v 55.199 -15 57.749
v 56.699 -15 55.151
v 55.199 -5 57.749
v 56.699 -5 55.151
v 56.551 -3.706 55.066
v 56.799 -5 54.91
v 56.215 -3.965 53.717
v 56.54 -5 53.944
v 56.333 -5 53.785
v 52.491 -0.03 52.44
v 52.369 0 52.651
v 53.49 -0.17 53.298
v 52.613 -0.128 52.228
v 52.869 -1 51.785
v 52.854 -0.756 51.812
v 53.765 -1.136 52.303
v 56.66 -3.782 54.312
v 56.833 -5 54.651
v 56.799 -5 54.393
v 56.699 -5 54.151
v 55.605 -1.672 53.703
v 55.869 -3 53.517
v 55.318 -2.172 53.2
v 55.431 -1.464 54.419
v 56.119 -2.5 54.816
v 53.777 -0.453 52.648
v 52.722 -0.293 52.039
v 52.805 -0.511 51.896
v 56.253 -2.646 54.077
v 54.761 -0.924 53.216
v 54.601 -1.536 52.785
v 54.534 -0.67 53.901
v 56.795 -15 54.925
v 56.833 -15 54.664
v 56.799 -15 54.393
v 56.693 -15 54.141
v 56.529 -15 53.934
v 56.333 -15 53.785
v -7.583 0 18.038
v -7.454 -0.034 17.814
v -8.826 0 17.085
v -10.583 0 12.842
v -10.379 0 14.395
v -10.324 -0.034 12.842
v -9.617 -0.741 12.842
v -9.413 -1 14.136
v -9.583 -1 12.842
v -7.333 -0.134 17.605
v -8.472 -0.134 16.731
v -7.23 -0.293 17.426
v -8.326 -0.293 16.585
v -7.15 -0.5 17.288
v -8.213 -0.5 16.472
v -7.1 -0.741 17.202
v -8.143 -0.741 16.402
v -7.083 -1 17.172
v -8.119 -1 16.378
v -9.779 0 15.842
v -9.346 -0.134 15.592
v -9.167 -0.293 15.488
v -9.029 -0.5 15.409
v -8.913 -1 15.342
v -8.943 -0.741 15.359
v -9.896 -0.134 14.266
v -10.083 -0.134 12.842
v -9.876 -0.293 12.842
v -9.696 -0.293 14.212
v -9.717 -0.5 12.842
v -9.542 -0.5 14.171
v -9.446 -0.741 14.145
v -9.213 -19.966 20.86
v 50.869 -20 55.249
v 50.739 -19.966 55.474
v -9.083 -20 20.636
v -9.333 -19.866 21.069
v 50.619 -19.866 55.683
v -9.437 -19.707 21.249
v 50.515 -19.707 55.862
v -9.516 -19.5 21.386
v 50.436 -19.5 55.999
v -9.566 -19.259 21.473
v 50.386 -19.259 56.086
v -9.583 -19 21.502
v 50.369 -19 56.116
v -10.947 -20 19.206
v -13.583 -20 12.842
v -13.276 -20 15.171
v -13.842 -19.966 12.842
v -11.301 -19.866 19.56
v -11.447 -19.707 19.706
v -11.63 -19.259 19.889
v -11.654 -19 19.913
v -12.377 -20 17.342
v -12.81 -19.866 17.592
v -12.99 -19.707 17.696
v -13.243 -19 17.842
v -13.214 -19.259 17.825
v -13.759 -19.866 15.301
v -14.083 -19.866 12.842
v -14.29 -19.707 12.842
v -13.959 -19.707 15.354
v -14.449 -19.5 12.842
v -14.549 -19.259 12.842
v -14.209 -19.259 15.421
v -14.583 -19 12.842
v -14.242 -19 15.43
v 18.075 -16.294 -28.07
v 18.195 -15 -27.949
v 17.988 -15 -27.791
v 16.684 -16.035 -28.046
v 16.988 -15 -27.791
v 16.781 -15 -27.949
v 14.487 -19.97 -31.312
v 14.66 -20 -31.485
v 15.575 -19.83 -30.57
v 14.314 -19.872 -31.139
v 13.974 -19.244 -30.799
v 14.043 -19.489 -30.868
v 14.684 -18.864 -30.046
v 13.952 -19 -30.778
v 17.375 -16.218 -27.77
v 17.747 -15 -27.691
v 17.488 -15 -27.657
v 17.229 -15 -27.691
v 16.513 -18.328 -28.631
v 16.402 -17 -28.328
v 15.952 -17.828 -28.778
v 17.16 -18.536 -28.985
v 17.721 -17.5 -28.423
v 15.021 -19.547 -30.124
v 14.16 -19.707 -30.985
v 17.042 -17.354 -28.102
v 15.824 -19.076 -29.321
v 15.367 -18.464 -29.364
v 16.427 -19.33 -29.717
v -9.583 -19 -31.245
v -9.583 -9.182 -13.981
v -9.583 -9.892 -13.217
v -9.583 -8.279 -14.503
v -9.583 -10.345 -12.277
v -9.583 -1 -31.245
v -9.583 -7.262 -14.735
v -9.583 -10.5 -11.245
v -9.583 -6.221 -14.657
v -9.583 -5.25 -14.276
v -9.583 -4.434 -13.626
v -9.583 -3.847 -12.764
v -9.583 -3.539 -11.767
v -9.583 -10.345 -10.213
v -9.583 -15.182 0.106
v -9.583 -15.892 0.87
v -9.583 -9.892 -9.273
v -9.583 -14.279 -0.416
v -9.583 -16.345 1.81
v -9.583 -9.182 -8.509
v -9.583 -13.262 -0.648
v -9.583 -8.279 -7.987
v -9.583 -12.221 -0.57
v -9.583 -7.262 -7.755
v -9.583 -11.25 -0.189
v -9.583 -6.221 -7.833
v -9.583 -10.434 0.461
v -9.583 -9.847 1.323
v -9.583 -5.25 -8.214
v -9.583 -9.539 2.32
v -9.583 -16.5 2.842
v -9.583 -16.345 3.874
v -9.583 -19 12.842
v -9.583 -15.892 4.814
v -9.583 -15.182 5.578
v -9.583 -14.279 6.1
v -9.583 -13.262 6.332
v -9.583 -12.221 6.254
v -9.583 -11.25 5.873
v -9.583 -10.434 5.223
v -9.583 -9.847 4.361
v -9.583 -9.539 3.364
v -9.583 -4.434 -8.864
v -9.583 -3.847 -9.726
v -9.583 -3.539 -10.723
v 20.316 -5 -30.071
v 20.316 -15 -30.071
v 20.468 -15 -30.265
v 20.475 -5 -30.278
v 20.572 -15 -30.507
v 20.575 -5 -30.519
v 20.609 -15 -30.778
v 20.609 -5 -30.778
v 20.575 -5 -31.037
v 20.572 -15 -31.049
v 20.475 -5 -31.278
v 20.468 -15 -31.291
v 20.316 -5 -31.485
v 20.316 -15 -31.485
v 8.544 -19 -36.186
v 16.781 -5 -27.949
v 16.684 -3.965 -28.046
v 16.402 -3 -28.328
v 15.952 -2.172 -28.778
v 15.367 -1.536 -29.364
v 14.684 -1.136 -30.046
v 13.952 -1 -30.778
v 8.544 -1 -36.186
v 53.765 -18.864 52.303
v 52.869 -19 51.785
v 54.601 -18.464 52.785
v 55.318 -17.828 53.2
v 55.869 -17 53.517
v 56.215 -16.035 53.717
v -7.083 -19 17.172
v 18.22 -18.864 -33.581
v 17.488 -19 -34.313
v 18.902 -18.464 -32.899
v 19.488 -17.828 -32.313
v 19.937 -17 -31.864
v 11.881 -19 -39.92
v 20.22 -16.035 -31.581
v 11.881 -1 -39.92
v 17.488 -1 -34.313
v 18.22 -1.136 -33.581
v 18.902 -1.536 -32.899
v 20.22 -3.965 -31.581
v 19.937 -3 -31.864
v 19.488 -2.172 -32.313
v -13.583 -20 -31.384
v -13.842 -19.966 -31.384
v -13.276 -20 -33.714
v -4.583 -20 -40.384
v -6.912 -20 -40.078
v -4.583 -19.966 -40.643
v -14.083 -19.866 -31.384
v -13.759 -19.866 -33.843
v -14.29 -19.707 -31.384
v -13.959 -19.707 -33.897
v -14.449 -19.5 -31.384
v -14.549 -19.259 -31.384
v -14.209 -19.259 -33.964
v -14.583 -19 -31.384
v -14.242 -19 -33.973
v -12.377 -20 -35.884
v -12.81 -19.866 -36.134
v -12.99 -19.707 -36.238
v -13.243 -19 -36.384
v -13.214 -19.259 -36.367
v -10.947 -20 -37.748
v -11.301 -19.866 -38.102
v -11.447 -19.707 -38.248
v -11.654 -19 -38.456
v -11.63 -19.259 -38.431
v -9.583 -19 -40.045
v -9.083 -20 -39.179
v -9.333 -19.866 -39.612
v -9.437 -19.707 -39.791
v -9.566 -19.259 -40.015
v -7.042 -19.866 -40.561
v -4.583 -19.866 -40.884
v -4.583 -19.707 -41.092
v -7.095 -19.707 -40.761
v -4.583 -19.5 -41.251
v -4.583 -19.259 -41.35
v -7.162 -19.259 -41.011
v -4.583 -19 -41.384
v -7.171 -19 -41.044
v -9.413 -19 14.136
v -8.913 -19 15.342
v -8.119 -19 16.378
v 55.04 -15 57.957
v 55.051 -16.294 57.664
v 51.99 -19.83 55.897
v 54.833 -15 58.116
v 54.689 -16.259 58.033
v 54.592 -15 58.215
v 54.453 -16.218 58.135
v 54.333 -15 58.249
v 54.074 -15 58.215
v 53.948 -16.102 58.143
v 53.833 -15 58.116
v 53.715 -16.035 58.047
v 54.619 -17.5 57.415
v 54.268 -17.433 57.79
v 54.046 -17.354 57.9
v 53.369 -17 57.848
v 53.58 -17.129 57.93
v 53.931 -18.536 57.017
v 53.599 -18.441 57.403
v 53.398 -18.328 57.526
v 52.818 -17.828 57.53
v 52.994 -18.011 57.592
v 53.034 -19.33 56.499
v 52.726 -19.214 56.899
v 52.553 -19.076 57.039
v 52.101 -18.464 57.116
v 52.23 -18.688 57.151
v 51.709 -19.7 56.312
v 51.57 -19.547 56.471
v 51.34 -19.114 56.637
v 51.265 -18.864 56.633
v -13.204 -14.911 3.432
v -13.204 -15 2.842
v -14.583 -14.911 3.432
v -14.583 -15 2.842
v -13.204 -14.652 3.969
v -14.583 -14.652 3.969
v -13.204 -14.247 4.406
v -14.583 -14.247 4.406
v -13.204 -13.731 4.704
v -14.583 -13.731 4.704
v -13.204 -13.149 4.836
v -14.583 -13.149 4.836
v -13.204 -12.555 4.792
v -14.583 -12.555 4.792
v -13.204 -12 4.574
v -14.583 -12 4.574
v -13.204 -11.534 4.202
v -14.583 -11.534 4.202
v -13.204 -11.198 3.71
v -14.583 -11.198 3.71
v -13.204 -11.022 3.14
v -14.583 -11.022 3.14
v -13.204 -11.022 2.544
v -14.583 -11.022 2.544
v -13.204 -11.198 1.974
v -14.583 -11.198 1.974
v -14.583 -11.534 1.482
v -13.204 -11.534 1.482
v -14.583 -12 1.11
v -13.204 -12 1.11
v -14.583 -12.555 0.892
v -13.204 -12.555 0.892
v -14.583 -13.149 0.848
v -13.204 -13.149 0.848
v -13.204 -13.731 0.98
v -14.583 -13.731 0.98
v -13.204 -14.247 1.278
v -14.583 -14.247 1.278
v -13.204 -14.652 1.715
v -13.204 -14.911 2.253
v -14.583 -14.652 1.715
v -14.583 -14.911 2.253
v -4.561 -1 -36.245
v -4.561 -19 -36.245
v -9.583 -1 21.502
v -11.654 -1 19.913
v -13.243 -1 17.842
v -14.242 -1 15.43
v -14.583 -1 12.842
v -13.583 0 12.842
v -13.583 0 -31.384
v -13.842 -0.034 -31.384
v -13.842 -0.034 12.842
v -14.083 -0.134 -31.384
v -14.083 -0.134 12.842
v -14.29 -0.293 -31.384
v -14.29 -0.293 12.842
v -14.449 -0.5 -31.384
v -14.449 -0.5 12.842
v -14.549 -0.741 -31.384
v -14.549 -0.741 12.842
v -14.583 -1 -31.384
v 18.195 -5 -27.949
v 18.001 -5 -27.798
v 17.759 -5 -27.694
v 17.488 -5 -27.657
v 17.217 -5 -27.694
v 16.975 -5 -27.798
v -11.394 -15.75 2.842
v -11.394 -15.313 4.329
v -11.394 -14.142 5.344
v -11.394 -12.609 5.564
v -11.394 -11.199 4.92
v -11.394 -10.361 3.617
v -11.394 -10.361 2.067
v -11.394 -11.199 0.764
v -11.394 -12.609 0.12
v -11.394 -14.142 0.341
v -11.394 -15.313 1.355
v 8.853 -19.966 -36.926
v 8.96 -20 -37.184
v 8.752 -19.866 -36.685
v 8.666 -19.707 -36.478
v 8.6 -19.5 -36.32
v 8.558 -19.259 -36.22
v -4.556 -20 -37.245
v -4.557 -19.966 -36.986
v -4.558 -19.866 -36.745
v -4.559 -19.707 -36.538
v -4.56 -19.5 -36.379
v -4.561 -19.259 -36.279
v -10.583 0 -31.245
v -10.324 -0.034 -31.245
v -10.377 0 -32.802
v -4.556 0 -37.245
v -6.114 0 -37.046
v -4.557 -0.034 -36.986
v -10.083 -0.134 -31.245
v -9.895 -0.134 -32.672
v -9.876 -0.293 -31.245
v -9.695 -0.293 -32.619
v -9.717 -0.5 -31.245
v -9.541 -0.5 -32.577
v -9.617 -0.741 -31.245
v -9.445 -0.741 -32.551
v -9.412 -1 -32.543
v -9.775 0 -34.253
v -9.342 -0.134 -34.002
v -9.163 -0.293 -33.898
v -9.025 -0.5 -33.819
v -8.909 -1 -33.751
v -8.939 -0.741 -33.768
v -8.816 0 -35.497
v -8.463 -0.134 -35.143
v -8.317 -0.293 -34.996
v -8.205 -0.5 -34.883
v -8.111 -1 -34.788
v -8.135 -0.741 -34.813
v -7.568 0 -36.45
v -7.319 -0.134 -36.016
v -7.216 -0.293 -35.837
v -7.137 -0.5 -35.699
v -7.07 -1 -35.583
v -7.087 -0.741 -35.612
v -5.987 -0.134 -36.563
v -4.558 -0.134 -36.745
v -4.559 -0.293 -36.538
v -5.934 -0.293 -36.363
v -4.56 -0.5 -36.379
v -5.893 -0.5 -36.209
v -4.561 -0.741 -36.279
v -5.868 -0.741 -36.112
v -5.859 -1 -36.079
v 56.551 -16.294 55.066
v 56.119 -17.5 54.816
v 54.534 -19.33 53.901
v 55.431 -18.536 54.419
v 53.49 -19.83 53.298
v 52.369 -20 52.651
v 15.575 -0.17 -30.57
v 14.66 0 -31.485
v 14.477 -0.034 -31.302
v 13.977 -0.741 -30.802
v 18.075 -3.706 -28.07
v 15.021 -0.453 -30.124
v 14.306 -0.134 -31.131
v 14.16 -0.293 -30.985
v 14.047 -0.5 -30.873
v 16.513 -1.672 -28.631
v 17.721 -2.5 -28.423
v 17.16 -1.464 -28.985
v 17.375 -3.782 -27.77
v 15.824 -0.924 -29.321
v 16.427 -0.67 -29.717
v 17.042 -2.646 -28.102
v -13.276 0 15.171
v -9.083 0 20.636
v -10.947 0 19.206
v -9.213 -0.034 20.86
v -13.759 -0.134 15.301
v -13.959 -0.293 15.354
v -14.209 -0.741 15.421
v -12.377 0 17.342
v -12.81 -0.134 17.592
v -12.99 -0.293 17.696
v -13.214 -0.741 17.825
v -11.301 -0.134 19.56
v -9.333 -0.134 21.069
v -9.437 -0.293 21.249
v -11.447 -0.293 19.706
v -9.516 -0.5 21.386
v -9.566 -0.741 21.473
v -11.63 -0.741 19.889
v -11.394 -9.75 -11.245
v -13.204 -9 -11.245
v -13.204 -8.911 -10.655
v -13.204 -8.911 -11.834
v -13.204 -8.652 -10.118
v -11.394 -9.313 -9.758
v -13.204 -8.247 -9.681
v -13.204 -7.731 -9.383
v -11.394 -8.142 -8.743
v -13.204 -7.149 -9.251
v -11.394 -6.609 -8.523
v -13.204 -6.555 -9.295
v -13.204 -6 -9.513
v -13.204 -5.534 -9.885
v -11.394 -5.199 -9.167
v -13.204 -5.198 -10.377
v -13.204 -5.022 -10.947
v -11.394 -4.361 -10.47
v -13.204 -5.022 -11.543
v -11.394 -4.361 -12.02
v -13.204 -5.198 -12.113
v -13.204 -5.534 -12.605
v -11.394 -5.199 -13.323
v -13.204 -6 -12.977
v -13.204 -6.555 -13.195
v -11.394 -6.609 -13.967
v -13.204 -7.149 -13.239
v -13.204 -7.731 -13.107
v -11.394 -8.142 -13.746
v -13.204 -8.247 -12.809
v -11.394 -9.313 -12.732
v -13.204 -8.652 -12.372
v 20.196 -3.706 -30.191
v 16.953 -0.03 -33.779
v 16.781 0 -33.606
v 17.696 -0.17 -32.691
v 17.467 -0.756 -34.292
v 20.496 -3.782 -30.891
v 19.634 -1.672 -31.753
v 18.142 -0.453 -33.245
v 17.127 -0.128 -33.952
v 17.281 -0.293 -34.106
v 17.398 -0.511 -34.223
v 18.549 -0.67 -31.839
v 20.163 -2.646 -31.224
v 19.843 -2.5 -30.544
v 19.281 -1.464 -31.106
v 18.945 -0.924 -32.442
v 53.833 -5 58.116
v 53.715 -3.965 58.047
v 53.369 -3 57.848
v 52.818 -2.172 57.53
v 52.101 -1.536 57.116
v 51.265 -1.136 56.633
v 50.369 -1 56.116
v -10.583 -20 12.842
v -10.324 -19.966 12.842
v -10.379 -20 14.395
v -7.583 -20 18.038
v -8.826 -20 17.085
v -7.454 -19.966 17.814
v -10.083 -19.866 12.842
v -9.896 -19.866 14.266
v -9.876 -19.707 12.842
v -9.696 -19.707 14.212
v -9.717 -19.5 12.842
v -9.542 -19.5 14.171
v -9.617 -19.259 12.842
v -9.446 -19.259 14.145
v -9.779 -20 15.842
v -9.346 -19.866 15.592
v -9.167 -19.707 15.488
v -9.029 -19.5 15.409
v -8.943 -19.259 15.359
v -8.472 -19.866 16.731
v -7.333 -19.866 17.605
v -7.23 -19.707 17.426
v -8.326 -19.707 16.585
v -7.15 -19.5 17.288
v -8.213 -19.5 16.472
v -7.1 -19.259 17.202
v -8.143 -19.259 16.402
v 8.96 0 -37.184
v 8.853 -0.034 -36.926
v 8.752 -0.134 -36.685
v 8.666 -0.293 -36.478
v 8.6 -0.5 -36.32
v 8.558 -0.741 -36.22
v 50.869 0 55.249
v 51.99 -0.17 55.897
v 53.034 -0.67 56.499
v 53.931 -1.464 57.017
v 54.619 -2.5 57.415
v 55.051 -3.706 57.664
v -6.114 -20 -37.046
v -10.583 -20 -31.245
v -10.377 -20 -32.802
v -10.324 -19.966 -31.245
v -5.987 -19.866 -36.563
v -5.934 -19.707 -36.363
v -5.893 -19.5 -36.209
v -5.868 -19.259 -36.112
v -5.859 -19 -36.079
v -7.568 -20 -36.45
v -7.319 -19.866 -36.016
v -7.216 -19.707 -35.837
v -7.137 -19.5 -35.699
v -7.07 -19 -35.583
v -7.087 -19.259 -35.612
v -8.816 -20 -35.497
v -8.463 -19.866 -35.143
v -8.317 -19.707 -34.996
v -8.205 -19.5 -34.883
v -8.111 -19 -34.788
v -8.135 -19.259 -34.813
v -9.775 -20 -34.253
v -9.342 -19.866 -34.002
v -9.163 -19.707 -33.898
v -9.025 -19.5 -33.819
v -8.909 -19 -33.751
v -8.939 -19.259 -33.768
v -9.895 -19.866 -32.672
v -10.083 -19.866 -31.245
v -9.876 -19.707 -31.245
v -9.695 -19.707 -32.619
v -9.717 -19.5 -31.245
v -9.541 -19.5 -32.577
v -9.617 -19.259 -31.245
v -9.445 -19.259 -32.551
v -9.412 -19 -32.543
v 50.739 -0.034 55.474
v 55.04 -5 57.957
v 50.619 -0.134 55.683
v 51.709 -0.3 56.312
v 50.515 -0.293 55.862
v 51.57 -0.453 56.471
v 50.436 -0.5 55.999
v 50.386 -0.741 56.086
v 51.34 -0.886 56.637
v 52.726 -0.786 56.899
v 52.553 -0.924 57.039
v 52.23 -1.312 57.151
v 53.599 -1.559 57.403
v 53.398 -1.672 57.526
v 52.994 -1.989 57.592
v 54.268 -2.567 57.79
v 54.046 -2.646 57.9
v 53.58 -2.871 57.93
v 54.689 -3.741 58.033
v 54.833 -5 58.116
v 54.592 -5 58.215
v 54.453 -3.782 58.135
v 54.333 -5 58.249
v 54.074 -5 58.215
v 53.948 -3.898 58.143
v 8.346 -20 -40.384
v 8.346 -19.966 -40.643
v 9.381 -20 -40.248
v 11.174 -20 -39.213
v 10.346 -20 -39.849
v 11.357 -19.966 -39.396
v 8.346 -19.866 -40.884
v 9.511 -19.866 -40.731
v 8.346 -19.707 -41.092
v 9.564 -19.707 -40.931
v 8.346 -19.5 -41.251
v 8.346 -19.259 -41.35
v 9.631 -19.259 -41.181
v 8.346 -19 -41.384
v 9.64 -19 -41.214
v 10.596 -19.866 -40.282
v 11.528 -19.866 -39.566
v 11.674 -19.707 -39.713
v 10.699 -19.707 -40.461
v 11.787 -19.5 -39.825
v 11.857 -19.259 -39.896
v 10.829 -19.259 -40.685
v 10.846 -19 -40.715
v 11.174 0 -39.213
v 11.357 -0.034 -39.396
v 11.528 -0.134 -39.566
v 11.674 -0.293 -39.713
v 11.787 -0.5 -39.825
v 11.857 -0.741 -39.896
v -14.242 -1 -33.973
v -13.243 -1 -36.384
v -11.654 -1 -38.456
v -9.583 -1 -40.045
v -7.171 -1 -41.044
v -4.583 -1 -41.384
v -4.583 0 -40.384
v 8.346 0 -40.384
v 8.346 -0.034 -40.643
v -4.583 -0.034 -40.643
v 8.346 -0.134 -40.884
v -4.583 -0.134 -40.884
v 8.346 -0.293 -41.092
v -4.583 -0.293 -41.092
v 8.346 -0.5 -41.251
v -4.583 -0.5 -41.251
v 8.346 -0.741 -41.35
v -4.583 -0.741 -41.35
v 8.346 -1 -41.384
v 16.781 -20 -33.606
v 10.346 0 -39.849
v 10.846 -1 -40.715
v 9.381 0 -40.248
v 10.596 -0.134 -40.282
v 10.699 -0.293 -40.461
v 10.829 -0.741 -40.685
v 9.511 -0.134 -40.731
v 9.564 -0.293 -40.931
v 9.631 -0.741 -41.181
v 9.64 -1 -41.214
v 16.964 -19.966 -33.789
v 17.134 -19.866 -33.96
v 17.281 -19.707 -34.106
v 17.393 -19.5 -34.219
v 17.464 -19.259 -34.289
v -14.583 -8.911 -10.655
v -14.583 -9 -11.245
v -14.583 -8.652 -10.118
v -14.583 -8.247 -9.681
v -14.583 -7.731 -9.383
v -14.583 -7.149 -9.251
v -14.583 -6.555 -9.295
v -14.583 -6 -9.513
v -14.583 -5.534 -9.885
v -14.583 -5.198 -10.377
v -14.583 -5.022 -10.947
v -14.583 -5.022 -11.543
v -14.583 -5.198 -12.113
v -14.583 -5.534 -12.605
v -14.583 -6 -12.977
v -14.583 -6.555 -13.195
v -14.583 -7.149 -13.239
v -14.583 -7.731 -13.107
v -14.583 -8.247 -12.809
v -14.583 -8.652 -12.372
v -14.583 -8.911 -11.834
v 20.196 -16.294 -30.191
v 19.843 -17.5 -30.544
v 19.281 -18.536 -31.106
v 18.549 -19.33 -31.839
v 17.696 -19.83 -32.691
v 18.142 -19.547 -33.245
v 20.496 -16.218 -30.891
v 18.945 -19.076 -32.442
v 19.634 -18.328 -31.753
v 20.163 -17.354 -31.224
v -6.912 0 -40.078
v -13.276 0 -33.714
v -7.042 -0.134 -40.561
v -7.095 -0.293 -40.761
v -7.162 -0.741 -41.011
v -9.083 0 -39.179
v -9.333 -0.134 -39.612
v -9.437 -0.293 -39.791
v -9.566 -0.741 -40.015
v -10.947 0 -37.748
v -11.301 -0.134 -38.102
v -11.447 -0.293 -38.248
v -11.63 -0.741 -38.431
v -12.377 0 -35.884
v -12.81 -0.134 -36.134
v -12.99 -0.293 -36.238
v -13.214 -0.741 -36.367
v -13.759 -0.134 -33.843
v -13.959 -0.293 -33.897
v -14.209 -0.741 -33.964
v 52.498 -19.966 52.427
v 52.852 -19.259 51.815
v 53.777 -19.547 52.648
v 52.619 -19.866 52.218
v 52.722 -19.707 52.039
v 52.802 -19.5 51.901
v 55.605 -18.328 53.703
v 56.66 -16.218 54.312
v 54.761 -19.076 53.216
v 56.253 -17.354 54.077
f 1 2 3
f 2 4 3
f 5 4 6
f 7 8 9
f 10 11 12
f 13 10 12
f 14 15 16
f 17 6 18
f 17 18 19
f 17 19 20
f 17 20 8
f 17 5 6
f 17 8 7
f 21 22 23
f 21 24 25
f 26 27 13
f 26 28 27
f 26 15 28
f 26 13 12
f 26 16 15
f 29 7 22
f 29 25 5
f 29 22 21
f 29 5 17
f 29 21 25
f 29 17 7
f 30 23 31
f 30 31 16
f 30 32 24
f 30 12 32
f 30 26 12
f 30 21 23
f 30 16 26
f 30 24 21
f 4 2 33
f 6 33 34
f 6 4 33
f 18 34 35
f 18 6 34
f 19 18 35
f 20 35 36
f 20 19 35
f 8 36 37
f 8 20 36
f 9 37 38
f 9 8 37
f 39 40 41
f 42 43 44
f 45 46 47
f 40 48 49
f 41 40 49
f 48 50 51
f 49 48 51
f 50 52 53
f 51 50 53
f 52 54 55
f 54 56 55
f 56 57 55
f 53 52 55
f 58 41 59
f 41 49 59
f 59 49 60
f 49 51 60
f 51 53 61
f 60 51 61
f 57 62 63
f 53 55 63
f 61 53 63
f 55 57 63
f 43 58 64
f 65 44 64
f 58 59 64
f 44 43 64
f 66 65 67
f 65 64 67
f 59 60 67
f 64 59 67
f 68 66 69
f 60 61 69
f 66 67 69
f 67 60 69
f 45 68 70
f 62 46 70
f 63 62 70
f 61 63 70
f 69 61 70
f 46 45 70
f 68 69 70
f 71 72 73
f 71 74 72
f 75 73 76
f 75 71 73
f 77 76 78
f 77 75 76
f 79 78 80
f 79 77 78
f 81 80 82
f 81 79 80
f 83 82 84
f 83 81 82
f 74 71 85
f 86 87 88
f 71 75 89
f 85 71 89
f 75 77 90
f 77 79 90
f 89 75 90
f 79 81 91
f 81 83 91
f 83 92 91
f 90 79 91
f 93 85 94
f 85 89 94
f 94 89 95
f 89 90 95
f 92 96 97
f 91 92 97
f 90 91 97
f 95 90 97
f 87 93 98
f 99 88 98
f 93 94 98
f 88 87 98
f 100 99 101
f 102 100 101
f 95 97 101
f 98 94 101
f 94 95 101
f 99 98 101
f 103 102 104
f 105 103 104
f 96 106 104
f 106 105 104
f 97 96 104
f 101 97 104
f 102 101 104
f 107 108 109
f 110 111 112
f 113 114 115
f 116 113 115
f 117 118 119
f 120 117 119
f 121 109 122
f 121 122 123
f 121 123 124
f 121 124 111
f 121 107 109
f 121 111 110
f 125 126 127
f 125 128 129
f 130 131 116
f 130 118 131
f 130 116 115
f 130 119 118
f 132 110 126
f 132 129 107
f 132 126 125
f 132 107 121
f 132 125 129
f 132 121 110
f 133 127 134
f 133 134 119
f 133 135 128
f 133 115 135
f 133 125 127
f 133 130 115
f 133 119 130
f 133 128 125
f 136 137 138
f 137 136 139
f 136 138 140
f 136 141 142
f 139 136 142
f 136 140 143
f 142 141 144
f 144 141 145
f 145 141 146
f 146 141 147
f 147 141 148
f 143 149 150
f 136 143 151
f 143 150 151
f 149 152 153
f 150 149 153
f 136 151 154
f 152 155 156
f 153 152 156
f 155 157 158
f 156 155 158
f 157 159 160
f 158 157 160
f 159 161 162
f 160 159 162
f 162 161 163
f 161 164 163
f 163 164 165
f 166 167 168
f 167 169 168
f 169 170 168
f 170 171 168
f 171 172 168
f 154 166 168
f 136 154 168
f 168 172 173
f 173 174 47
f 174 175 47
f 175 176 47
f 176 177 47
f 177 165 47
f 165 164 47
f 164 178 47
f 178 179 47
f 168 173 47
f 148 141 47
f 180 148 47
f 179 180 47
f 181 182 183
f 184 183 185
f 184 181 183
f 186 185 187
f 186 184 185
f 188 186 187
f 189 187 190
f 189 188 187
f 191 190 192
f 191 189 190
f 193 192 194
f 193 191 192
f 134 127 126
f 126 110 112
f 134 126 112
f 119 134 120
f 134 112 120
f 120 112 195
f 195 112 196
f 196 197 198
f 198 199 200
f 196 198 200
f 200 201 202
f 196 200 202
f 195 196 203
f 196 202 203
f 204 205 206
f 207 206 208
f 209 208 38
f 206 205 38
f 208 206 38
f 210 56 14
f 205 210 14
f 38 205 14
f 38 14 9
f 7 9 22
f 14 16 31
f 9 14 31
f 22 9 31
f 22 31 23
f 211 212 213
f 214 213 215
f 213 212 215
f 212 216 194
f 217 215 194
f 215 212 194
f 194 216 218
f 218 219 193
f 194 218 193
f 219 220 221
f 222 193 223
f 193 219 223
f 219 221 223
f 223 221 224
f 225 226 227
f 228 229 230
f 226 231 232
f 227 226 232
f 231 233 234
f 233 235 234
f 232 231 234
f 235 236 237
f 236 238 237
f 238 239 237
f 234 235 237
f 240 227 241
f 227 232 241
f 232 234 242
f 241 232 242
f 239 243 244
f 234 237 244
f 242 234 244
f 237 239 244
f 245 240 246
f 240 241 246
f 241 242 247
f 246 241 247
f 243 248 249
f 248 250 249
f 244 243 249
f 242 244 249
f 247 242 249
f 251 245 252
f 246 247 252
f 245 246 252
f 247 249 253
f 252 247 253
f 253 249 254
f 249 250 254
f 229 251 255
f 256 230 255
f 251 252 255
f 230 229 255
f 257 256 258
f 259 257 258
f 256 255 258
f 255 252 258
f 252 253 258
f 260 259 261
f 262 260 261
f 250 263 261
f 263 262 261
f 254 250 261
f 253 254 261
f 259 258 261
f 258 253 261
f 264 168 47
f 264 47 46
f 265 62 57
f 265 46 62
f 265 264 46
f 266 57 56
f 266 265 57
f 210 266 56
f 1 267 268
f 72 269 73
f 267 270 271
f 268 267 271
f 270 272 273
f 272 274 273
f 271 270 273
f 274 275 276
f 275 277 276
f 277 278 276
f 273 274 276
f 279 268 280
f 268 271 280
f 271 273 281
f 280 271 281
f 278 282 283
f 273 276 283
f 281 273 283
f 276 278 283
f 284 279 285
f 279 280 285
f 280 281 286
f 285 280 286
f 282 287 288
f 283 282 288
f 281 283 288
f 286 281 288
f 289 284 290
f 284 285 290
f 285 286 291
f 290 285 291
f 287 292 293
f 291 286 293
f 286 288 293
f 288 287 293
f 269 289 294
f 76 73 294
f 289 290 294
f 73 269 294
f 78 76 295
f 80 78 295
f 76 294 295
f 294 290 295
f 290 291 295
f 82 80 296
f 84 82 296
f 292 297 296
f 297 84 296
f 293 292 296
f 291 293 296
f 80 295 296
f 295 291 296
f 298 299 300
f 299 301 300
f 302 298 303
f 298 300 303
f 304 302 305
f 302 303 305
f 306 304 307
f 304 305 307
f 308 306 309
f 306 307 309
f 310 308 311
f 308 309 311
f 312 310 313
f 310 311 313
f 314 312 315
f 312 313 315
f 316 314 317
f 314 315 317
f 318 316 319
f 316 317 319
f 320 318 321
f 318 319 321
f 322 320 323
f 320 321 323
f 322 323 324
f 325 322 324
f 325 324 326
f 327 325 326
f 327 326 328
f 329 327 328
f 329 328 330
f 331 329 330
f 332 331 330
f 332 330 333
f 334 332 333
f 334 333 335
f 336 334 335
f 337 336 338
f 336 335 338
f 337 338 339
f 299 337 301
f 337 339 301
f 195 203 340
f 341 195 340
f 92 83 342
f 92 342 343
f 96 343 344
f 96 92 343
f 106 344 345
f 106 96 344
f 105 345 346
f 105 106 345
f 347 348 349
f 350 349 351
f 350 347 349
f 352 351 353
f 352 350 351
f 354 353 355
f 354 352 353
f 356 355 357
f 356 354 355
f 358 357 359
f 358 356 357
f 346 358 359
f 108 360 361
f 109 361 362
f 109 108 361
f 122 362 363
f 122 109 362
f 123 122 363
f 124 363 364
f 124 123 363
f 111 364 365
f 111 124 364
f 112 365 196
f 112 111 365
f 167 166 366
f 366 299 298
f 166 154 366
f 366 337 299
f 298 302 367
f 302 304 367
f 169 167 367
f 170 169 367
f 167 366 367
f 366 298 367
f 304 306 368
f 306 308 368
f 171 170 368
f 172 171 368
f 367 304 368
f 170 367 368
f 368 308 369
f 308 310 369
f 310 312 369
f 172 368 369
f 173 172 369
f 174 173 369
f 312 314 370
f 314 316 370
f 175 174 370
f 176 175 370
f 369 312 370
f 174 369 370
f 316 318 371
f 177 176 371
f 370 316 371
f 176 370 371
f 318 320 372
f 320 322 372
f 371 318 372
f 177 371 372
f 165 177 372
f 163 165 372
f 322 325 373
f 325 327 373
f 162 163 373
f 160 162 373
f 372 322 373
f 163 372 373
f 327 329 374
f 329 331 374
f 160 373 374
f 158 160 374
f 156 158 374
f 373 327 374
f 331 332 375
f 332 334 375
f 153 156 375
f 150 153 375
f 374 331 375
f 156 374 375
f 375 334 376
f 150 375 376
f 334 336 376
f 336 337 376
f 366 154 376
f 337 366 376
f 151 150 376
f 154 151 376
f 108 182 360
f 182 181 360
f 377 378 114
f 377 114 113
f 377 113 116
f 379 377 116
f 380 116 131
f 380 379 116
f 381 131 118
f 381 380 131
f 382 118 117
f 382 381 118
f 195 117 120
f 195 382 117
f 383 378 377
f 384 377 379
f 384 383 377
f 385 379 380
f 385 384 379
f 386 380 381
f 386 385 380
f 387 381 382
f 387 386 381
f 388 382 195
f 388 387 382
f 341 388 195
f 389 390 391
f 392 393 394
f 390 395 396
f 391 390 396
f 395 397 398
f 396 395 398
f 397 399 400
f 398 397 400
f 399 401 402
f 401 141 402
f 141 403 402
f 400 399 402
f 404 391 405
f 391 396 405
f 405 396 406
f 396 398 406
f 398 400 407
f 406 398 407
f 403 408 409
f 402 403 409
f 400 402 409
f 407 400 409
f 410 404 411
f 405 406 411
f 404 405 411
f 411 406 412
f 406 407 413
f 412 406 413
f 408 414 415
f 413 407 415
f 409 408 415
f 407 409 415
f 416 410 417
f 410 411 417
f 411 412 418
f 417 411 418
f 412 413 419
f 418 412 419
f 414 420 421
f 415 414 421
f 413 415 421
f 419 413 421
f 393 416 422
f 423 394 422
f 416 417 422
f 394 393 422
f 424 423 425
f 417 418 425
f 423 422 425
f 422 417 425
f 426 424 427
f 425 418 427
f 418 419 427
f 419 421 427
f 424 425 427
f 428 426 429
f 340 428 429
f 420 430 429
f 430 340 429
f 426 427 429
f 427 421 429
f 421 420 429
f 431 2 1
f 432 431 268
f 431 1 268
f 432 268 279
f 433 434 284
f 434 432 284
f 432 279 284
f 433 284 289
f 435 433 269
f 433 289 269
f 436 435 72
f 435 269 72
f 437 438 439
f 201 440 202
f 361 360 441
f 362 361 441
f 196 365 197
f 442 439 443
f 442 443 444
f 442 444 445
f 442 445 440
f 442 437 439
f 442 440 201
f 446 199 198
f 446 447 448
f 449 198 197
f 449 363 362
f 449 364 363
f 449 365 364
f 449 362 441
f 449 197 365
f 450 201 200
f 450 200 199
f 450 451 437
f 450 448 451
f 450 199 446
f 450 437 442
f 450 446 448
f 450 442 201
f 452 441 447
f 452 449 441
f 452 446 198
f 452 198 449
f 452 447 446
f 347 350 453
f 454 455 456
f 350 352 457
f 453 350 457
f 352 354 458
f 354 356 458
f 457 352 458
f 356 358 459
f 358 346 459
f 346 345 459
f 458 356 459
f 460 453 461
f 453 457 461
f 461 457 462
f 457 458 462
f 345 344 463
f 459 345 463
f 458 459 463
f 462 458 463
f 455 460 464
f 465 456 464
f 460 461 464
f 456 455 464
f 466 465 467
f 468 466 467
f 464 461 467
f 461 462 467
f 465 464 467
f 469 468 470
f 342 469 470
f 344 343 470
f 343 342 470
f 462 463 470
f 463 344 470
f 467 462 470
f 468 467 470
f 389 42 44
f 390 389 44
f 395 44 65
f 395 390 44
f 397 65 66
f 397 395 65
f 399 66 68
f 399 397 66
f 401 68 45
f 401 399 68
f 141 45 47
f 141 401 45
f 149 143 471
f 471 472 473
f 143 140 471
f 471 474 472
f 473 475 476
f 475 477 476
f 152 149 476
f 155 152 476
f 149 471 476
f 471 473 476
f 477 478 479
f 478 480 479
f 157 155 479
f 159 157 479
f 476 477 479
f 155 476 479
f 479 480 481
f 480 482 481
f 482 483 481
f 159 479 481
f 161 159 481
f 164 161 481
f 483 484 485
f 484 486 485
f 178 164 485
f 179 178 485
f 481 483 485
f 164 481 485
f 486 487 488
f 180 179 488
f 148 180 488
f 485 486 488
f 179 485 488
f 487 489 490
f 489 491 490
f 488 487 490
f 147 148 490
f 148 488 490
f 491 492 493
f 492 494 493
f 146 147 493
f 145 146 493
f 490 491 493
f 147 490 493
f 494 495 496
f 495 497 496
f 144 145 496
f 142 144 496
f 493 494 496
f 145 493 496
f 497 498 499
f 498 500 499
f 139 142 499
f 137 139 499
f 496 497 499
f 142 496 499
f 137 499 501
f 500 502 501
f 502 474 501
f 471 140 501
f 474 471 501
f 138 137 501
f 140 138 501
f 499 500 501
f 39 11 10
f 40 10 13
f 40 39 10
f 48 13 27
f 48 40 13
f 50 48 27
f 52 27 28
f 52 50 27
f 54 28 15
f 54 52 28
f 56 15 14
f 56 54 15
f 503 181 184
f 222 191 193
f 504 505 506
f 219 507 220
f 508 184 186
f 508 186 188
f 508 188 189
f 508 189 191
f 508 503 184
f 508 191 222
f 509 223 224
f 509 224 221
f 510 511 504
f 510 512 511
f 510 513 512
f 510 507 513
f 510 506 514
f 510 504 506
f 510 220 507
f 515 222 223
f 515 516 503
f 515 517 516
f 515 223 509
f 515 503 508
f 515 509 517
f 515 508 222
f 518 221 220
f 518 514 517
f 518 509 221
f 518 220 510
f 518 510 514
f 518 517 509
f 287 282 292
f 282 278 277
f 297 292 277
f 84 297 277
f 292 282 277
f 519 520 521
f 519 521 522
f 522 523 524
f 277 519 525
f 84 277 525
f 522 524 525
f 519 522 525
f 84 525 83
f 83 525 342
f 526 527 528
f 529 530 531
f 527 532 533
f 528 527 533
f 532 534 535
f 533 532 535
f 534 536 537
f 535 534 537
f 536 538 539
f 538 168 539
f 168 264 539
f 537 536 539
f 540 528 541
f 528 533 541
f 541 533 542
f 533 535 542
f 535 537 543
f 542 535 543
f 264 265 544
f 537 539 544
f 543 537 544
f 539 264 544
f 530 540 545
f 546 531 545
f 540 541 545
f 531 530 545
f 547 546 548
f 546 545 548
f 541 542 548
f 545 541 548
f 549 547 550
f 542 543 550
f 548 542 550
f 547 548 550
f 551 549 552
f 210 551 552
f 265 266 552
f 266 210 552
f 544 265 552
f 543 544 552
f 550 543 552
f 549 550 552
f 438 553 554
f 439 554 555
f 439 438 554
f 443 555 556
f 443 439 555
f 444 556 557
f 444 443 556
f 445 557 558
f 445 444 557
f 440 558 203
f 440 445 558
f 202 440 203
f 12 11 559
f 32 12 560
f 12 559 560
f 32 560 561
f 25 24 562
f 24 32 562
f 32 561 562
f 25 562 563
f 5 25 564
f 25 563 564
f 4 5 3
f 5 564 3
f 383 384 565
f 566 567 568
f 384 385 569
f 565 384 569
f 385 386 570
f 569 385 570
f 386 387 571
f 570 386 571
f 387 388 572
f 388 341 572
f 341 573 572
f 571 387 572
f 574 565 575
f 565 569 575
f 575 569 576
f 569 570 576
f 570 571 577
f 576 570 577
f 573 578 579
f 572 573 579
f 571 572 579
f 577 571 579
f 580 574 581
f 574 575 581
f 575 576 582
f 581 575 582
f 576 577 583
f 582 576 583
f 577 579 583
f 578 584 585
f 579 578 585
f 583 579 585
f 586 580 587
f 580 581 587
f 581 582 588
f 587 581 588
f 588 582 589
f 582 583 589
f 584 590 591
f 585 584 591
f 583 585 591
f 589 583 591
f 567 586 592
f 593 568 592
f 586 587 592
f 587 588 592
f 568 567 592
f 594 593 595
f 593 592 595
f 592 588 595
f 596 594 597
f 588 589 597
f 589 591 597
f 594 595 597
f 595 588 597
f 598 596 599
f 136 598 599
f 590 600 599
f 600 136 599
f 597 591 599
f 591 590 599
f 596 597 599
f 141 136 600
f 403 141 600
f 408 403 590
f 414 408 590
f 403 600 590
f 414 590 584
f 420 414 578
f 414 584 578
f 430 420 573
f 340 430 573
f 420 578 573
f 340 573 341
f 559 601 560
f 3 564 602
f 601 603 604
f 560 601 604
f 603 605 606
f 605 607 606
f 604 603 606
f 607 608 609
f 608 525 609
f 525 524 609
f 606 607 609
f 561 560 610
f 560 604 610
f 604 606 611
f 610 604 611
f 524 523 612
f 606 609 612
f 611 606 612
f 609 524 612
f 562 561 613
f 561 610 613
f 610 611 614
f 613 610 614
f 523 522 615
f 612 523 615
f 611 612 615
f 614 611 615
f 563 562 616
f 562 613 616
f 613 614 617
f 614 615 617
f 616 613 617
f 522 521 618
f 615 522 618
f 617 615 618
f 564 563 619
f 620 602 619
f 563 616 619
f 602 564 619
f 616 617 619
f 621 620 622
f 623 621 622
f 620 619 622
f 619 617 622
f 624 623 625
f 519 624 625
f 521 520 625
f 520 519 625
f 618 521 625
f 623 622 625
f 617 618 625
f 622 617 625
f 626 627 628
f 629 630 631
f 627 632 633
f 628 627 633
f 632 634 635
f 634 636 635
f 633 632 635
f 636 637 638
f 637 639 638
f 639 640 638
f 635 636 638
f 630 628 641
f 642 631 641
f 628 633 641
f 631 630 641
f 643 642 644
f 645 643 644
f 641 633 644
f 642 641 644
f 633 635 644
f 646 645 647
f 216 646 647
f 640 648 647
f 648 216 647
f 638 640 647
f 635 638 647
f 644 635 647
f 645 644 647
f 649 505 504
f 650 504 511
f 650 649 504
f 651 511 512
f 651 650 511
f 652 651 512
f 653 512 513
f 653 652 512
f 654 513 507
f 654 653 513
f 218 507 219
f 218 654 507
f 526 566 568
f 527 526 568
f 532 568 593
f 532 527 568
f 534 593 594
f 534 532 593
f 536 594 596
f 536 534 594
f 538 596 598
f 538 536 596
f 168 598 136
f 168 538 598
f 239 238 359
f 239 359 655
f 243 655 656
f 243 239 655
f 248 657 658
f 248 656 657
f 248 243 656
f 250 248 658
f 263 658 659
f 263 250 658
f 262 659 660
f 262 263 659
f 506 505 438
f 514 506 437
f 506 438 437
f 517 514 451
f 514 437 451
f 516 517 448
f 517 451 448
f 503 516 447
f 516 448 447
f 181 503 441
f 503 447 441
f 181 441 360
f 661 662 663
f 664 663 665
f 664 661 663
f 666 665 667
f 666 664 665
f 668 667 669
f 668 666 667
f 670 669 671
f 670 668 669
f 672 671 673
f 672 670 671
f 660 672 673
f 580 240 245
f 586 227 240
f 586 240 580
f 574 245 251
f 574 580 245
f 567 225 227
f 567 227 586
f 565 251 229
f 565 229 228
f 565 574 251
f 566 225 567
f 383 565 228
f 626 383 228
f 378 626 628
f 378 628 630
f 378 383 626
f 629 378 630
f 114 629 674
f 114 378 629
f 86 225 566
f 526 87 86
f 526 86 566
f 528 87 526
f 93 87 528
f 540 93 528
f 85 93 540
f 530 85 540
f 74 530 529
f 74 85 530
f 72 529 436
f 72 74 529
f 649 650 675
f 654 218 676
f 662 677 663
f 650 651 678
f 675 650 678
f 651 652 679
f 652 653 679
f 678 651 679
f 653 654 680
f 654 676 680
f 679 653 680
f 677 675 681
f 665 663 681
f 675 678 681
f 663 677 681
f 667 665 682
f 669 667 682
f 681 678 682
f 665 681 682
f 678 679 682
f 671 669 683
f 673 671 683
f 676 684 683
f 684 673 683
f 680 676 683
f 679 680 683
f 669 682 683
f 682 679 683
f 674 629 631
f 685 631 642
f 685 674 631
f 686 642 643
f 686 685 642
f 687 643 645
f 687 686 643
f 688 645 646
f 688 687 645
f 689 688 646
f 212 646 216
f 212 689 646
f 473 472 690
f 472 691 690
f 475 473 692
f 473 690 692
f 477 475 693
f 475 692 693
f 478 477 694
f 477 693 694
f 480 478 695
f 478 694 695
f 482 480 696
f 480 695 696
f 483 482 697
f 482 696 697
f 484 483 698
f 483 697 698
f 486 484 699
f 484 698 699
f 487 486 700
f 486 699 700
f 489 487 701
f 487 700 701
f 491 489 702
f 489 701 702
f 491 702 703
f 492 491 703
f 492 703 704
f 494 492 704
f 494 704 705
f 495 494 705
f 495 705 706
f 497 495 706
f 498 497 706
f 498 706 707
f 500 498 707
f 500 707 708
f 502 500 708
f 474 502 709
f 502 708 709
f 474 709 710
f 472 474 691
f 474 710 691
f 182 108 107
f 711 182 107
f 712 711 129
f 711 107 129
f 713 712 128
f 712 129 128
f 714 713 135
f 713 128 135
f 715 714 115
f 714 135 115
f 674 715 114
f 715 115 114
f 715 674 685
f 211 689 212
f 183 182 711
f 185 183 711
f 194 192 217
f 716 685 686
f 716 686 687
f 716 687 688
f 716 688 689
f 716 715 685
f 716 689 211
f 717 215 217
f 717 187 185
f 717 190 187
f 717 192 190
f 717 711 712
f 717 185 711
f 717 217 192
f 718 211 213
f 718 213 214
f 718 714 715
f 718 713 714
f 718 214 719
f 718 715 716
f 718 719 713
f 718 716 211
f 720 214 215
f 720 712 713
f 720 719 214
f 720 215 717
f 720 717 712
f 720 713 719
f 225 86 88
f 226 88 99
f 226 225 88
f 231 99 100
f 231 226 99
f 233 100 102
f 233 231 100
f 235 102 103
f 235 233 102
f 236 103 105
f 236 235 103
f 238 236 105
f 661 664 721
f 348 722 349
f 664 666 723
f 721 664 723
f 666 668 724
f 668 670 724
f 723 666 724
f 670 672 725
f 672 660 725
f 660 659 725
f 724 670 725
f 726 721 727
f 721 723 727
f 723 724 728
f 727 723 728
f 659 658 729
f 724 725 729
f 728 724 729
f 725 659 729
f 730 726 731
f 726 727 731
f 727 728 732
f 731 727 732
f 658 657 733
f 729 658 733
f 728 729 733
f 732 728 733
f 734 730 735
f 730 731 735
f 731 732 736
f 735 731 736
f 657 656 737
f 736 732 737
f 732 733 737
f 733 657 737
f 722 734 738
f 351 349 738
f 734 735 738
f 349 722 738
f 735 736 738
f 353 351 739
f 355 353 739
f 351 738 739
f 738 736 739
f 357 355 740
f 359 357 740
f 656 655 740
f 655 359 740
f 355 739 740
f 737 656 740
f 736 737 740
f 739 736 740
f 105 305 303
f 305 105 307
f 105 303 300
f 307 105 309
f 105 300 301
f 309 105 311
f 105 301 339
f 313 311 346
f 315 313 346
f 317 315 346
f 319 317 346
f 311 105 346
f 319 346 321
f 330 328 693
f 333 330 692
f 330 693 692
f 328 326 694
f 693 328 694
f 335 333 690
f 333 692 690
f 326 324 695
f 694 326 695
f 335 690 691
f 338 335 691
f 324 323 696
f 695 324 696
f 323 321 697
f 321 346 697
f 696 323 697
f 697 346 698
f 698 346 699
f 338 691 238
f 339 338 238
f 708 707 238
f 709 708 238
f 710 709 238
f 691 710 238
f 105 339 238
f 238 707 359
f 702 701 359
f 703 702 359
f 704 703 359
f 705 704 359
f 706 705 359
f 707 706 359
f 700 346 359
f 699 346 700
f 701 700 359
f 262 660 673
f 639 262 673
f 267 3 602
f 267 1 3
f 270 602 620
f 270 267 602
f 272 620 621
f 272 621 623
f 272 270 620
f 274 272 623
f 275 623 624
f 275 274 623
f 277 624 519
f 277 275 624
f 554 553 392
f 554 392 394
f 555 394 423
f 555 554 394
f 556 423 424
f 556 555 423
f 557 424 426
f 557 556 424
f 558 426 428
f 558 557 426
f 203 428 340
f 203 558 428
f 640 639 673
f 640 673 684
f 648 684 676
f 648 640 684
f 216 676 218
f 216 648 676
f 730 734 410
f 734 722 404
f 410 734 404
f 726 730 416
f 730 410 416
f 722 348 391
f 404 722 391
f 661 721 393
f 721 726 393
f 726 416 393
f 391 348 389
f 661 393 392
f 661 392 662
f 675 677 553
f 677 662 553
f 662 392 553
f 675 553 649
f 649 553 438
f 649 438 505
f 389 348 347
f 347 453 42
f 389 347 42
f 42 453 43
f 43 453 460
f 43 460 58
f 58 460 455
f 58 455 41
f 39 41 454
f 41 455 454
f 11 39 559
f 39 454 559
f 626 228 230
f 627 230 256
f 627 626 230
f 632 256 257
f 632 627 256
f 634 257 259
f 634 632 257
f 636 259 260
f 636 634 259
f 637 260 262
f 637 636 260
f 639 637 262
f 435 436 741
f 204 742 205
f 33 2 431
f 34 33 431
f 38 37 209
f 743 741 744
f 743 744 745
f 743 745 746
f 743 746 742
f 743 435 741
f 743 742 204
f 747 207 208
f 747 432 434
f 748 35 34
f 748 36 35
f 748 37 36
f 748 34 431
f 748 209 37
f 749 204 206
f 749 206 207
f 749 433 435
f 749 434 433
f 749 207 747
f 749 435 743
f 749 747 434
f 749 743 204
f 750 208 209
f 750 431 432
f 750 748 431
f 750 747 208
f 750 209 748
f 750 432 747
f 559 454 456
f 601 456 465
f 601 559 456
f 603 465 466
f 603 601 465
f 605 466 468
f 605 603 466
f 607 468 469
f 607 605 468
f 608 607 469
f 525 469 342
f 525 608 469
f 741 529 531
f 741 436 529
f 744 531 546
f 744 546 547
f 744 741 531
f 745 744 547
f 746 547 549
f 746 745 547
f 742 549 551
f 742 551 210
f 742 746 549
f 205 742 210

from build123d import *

# Parameters (mm, degrees)
F1_DEPTH        = 20
F2_R            = 10
F3_R            = 5
F4_R            = 5
F5_R            = 10
F6_R            = 5
F7_R            = 5
F8_R            = 5
F9_R            = 5
F10_R           = 5
F11_R           = 1
F12_R           = 1
F13_R           = 1
F15_D           = 4
F15_CSINK_D     = 7
F15_CSINK_ANGLE = 45
F16_D           = 4
F16_CSINK_D     = 7
F16_CSINK_ANGLE = 45


with BuildPart() as f1:
    # F0 (on Front) → F1 (new body)
    with BuildSketch(Plane.XZ):
        Polygon((-14.583103, 18.615519), (-14.583103, -41.384481), (10.416897, -41.384481), (21.023498, -30.777879), (17.487964, -27.242345), (8.544218, -36.186092), (-9.583103, -36.26743), (-9.583103, 15.728768), (57.198929, 54.285392), (54.698929, 58.615519), align=None)
    extrude(amount=F1_DEPTH)

    # F2
    f2_edges = [f1.edges().sort_by_distance(p)[0] for p in [
        (-14.583103, -10, -41.384481),
    ]]
    fillet(f2_edges, radius=F2_R)

    # F3
    f3_edges = [f1.edges().sort_by_distance(p)[0] for p in [
        (-9.583103, -10, -36.26743),
    ]]
    fillet(f3_edges, radius=F3_R)

    # F4
    f4_edges = [f1.edges().sort_by_distance(p)[0] for p in [
        (-9.583103, -10, 15.728768),
    ]]
    fillet(f4_edges, radius=F4_R)

    # F5
    f5_edges = [f1.edges().sort_by_distance(p)[0] for p in [
        (-14.583103, -10, 18.615519),
    ]]
    fillet(f5_edges, radius=F5_R)

    # F6
    f6_edges = [f1.edges().sort_by_distance(p)[0] for p in [
        (19.255731, 0, -29.010112),
    ]]
    fillet(f6_edges, radius=F6_R)

    # F7
    f7_edges = [f1.edges().sort_by_distance(p)[0] for p in [
        (19.255731, -20, -29.010112),
    ]]
    fillet(f7_edges, radius=F7_R)

    # F8
    f8_edges = [f1.edges().sort_by_distance(p)[0] for p in [
        (55.948929, 0, 56.450456),
    ]]
    fillet(f8_edges, radius=F8_R)

    # F9
    f9_edges = [f1.edges().sort_by_distance(p)[0] for p in [
        (55.948929, -20, 56.450456),
    ]]
    fillet(f9_edges, radius=F9_R)

    # F10
    f10_edges = [f1.edges().sort_by_distance(p)[0] for p in [
        (10.416897, -10, -41.384481),
    ]]
    fillet(f10_edges, radius=F10_R)

    # F11
    f11_edges = [f1.edges().sort_by_distance(p)[0] for p in [
        (22.892849, -20, 34.478768),
    ]]
    fillet(f11_edges, radius=F11_R)

    # F12
    f12_edges = [f1.edges().sort_by_distance(p)[0] for p in [
        (20.392849, -20, 38.808895),
    ]]
    fillet(f12_edges, radius=F12_R)

    # F13
    f13_edges = [f1.edges().sort_by_distance(p)[0] for p in [
        (11.248324, -20, -33.481985),
    ]]
    fillet(f13_edges, radius=F13_R)

    # F15 (through all)
    with Locations(Plane.YZ.offset(-9.583103)):
        with Locations((-7, -11.244944)):
            CounterSinkHole(F15_D / 2, F15_CSINK_D / 2, counter_sink_angle=F15_CSINK_ANGLE)

    # F16 (through all)
    with Locations(Plane.YZ.offset(-9.583103)):
        with Locations((-13, 2.842016)):
            CounterSinkHole(F16_D / 2, F16_CSINK_D / 2, counter_sink_angle=F16_CSINK_ANGLE)


solid = f1.part
